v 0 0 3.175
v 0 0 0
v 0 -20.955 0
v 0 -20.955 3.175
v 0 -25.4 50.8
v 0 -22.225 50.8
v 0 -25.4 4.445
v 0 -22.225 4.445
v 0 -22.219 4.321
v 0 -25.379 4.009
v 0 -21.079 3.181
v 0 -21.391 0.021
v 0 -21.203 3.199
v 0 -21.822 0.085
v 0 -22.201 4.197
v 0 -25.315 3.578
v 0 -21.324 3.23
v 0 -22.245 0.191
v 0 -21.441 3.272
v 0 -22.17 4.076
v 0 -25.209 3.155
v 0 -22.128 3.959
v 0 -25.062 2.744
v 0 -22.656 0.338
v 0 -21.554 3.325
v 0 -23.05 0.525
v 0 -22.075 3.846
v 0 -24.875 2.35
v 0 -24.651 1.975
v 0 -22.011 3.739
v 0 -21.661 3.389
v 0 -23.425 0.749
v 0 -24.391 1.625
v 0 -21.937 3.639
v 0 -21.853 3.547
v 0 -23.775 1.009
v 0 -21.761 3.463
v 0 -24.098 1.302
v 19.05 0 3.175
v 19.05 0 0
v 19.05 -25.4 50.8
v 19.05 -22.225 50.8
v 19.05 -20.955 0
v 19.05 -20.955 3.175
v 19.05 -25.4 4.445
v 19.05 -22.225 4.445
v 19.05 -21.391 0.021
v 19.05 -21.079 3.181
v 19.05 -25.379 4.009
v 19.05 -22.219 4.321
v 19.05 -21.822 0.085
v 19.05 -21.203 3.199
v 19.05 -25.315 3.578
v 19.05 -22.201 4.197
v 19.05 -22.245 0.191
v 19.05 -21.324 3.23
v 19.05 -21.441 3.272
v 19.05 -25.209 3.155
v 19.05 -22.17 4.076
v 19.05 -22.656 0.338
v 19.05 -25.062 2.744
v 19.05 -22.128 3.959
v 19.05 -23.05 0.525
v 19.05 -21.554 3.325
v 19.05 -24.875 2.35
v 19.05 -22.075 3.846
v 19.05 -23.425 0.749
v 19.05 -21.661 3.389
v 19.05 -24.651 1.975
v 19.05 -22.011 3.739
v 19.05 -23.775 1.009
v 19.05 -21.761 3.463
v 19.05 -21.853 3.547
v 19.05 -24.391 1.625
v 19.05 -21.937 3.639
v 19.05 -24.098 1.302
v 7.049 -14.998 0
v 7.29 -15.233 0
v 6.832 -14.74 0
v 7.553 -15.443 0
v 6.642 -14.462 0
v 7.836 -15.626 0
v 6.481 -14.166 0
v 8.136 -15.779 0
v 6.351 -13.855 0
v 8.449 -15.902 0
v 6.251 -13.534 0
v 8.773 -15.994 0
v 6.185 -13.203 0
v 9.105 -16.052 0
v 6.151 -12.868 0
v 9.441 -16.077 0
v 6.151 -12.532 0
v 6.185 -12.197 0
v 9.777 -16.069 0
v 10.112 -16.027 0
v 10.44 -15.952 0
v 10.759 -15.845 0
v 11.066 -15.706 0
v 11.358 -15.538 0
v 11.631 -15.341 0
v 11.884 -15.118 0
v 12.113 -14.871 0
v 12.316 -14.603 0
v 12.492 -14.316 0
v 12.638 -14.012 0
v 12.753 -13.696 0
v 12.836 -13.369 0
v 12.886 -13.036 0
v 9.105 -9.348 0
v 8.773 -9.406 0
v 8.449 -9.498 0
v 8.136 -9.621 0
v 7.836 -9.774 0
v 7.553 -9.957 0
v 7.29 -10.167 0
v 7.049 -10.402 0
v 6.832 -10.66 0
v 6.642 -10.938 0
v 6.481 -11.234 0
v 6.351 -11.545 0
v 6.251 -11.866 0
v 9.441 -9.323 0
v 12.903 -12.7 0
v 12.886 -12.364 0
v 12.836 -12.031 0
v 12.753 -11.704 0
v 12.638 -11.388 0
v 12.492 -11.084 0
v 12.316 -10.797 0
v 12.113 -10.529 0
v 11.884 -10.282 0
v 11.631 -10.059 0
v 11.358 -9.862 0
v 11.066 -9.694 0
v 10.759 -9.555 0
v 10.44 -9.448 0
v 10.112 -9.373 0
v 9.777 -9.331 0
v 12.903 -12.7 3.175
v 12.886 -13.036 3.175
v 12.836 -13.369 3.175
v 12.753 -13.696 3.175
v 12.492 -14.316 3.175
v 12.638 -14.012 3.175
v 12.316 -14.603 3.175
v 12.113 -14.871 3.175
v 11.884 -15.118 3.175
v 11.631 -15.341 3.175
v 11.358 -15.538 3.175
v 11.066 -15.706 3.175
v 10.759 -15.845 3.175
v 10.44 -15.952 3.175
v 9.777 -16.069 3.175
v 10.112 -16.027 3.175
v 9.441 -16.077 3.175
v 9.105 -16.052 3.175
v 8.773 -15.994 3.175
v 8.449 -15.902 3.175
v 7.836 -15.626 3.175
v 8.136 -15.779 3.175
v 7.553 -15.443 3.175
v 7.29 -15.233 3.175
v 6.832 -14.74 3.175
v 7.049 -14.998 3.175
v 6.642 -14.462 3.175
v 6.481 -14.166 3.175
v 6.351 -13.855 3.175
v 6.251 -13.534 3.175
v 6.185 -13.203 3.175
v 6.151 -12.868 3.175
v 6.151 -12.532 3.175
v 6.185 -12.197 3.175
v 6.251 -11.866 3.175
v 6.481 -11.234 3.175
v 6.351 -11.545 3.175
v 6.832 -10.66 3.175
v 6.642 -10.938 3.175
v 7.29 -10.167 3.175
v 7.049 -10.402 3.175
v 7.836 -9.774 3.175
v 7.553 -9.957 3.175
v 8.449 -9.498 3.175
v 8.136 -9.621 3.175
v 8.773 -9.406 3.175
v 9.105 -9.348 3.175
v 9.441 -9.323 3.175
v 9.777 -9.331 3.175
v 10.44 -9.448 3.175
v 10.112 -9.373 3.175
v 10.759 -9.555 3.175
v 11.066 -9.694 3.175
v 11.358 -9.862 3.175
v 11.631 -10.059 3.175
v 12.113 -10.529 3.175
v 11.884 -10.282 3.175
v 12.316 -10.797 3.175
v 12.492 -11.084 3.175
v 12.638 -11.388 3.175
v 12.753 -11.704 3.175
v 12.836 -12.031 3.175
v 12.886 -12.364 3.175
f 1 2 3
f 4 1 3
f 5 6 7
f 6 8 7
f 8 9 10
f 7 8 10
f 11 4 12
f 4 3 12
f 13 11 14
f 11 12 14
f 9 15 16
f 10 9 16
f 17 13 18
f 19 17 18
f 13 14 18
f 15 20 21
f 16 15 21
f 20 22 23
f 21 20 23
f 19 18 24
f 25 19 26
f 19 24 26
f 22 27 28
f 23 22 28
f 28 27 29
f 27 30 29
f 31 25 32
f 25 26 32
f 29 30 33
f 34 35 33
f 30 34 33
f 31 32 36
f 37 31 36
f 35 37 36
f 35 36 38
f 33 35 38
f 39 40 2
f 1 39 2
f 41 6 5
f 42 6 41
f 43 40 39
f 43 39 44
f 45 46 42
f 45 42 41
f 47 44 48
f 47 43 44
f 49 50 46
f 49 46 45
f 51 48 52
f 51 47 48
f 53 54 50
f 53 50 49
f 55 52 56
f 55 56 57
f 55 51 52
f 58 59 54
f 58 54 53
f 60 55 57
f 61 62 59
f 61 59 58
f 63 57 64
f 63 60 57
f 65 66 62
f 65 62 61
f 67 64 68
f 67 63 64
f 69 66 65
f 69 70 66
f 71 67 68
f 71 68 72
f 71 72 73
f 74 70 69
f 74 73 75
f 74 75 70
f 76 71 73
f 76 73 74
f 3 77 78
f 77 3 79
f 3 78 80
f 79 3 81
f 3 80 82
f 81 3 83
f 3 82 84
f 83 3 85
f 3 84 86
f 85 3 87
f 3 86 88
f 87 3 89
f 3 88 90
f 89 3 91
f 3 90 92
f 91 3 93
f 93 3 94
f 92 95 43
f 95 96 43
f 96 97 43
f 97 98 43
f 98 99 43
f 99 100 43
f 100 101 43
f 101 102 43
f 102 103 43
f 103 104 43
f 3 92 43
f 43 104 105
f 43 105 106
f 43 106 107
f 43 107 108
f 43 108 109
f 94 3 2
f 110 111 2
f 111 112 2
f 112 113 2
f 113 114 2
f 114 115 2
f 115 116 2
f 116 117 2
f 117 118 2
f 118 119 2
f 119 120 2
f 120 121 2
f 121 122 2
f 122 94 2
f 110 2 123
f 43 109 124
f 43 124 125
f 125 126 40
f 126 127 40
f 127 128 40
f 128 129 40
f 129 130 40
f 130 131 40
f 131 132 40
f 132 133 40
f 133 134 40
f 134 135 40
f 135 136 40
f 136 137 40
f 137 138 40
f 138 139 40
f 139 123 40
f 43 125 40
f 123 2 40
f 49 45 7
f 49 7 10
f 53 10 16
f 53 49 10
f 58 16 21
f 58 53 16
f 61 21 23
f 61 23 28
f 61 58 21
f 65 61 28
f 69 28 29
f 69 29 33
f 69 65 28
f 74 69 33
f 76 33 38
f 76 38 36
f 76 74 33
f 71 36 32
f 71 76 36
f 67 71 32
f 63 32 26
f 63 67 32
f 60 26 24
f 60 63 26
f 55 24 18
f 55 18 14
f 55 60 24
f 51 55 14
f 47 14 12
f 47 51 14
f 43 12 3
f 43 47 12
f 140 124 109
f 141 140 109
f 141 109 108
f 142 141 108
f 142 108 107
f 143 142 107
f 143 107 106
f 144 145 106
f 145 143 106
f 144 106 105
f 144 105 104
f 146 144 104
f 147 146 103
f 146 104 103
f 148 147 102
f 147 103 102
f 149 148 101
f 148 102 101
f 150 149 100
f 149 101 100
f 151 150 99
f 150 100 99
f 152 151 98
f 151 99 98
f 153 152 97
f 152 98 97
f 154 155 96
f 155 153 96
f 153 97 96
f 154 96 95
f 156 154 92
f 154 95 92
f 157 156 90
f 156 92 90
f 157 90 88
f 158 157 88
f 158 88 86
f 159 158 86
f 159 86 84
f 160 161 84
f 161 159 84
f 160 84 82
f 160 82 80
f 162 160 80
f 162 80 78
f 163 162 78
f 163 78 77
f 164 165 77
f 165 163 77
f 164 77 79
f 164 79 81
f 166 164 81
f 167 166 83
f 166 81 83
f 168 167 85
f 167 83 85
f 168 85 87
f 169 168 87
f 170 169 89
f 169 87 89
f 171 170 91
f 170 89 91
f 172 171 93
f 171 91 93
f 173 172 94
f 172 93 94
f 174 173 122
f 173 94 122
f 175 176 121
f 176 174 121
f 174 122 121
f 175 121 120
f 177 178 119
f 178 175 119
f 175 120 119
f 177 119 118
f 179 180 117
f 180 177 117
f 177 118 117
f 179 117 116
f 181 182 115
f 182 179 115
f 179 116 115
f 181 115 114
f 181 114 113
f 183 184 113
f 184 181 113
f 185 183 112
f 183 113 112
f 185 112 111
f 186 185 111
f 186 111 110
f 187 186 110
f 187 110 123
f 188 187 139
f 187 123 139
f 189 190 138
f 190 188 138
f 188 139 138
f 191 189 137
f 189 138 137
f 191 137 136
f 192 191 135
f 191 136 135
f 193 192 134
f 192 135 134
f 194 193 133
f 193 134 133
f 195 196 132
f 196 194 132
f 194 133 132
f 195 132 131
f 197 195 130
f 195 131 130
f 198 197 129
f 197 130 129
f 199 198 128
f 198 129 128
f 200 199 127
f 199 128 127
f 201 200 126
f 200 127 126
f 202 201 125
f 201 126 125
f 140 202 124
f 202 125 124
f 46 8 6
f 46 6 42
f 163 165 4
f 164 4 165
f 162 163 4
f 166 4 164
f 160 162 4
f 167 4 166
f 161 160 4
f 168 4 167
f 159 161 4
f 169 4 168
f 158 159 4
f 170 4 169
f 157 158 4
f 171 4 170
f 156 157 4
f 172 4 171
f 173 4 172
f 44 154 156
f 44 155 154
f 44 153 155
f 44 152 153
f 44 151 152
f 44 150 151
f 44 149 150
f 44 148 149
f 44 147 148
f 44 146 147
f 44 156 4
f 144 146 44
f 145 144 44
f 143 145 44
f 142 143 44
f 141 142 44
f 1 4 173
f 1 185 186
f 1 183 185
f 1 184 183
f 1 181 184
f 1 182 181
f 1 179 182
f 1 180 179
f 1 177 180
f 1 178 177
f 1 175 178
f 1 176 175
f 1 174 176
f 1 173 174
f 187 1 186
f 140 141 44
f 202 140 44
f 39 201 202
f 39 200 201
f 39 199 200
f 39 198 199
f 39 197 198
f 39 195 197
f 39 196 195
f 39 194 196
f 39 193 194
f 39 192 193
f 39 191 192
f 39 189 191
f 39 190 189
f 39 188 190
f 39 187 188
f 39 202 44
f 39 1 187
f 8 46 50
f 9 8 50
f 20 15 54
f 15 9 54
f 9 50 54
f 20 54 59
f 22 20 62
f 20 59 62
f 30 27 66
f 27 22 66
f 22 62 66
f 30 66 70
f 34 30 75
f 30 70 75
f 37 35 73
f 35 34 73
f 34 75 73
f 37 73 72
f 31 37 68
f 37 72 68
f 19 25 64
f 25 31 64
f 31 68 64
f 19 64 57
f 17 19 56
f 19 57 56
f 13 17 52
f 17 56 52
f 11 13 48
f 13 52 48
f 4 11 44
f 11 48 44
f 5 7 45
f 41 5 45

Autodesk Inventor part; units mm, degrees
ref_plane "YZ Plane" through (0, 0, 0) normal (1, 0, 0) x (0, 1, 0)
ref_plane "XZ Plane" through (0, 0, 0) normal (0, 1, 0) x (-1, 0, 0)
ref_plane "XY Plane" through (0, 0, 0) normal (0, 0, 1) x (1, 0, 0)
sketch "Sketch1" plane through (0, 0, 0) normal (0, 0, 1) x (1, 0, 0)
  circle A0 centre (9.525, -12.7) radius 3.3782
  line L0 (19.05, 0) -> (0, 0)
  line L1 (0, 0) -> (0, -25.4)
  line L2 (19.05, -25.4) -> (0, -25.4)
  line L3 (19.05, 0) -> (19.05, -25.4)
extrude "Plate1" add sketch "Sketch1" along normal blind 3.175
sketch "Sketch2" plane through (19.05, -22.225, 0) normal (0, -1, 0) x (1, 0, 0)
  line L0 (-19.05, 0) -> (0, 0)
  line L1 (0, 0) -> (0, 25.4)
  line L2 (0, 25.4) -> (-19.05, 25.4)
  line L3 (-19.05, 25.4) -> (-19.05, 0)
edge flange "Flange1" height 25.4 angle 90 thickness 3.175 bend radius 1.27 thickness toward (0, -1, 0) relief straight relief width 3.175 relief depth 1.5875 edges at (9.525, -25.4, 3.175) wall of the first edge with corners at (0, -22.225, 0) (19.05, -22.225, 0) (19.05, -22.225, 25.4) (0, -22.225, 25.4)
bend "Bend1"
corner "Corner1"
sketch "Sketch3" plane through (0, -25.4, 25.4) normal (0, 0, 1) x (1, 0, 0)
  line L0 (0, 0) -> (19.05, 0) projected
  line L1 (19.05, 3.175) -> (19.05, 0) projected
  line L2 (0, 3.175) -> (19.05, 3.175) projected
  line L3 (0, 3.175) -> (0, 0) projected
  point P0 (0, 25.4)
extrude "Extrusion1" add sketch "Sketch3" along normal blind 25.4
equation "\"d1\" = BendReliefWidth"
equation "\"d2\" = BendReliefDepth"
equation "\"d3\" = MinimumRemnant"
equation "\"d4\" = BendRadius"
equation "\"d8\" = CornerReliefSize"
equation "\"d9\" = GapSize"
equation "\"d10\" = JacobiRadiusSize"
equation "\"BendRadius\" = Thickness"
equation "\"BendReliefWidth\" = Thickness"
equation "\"BendReliefDepth\" = 0.5 * Thickness"
equation "\"CornerReliefSize\" = 4 * Thickness"
equation "\"MinimumRemnant\" = 2 * Thickness"
equation "\"TransitionRadius\" = BendRadius"
equation "\"JacobiRadiusSize\" = Thickness"
equation "\"GapSize\" = Thickness"
equation "\"d0\" = BendRadius"
equation "\"Thickness\" = 3.175"
